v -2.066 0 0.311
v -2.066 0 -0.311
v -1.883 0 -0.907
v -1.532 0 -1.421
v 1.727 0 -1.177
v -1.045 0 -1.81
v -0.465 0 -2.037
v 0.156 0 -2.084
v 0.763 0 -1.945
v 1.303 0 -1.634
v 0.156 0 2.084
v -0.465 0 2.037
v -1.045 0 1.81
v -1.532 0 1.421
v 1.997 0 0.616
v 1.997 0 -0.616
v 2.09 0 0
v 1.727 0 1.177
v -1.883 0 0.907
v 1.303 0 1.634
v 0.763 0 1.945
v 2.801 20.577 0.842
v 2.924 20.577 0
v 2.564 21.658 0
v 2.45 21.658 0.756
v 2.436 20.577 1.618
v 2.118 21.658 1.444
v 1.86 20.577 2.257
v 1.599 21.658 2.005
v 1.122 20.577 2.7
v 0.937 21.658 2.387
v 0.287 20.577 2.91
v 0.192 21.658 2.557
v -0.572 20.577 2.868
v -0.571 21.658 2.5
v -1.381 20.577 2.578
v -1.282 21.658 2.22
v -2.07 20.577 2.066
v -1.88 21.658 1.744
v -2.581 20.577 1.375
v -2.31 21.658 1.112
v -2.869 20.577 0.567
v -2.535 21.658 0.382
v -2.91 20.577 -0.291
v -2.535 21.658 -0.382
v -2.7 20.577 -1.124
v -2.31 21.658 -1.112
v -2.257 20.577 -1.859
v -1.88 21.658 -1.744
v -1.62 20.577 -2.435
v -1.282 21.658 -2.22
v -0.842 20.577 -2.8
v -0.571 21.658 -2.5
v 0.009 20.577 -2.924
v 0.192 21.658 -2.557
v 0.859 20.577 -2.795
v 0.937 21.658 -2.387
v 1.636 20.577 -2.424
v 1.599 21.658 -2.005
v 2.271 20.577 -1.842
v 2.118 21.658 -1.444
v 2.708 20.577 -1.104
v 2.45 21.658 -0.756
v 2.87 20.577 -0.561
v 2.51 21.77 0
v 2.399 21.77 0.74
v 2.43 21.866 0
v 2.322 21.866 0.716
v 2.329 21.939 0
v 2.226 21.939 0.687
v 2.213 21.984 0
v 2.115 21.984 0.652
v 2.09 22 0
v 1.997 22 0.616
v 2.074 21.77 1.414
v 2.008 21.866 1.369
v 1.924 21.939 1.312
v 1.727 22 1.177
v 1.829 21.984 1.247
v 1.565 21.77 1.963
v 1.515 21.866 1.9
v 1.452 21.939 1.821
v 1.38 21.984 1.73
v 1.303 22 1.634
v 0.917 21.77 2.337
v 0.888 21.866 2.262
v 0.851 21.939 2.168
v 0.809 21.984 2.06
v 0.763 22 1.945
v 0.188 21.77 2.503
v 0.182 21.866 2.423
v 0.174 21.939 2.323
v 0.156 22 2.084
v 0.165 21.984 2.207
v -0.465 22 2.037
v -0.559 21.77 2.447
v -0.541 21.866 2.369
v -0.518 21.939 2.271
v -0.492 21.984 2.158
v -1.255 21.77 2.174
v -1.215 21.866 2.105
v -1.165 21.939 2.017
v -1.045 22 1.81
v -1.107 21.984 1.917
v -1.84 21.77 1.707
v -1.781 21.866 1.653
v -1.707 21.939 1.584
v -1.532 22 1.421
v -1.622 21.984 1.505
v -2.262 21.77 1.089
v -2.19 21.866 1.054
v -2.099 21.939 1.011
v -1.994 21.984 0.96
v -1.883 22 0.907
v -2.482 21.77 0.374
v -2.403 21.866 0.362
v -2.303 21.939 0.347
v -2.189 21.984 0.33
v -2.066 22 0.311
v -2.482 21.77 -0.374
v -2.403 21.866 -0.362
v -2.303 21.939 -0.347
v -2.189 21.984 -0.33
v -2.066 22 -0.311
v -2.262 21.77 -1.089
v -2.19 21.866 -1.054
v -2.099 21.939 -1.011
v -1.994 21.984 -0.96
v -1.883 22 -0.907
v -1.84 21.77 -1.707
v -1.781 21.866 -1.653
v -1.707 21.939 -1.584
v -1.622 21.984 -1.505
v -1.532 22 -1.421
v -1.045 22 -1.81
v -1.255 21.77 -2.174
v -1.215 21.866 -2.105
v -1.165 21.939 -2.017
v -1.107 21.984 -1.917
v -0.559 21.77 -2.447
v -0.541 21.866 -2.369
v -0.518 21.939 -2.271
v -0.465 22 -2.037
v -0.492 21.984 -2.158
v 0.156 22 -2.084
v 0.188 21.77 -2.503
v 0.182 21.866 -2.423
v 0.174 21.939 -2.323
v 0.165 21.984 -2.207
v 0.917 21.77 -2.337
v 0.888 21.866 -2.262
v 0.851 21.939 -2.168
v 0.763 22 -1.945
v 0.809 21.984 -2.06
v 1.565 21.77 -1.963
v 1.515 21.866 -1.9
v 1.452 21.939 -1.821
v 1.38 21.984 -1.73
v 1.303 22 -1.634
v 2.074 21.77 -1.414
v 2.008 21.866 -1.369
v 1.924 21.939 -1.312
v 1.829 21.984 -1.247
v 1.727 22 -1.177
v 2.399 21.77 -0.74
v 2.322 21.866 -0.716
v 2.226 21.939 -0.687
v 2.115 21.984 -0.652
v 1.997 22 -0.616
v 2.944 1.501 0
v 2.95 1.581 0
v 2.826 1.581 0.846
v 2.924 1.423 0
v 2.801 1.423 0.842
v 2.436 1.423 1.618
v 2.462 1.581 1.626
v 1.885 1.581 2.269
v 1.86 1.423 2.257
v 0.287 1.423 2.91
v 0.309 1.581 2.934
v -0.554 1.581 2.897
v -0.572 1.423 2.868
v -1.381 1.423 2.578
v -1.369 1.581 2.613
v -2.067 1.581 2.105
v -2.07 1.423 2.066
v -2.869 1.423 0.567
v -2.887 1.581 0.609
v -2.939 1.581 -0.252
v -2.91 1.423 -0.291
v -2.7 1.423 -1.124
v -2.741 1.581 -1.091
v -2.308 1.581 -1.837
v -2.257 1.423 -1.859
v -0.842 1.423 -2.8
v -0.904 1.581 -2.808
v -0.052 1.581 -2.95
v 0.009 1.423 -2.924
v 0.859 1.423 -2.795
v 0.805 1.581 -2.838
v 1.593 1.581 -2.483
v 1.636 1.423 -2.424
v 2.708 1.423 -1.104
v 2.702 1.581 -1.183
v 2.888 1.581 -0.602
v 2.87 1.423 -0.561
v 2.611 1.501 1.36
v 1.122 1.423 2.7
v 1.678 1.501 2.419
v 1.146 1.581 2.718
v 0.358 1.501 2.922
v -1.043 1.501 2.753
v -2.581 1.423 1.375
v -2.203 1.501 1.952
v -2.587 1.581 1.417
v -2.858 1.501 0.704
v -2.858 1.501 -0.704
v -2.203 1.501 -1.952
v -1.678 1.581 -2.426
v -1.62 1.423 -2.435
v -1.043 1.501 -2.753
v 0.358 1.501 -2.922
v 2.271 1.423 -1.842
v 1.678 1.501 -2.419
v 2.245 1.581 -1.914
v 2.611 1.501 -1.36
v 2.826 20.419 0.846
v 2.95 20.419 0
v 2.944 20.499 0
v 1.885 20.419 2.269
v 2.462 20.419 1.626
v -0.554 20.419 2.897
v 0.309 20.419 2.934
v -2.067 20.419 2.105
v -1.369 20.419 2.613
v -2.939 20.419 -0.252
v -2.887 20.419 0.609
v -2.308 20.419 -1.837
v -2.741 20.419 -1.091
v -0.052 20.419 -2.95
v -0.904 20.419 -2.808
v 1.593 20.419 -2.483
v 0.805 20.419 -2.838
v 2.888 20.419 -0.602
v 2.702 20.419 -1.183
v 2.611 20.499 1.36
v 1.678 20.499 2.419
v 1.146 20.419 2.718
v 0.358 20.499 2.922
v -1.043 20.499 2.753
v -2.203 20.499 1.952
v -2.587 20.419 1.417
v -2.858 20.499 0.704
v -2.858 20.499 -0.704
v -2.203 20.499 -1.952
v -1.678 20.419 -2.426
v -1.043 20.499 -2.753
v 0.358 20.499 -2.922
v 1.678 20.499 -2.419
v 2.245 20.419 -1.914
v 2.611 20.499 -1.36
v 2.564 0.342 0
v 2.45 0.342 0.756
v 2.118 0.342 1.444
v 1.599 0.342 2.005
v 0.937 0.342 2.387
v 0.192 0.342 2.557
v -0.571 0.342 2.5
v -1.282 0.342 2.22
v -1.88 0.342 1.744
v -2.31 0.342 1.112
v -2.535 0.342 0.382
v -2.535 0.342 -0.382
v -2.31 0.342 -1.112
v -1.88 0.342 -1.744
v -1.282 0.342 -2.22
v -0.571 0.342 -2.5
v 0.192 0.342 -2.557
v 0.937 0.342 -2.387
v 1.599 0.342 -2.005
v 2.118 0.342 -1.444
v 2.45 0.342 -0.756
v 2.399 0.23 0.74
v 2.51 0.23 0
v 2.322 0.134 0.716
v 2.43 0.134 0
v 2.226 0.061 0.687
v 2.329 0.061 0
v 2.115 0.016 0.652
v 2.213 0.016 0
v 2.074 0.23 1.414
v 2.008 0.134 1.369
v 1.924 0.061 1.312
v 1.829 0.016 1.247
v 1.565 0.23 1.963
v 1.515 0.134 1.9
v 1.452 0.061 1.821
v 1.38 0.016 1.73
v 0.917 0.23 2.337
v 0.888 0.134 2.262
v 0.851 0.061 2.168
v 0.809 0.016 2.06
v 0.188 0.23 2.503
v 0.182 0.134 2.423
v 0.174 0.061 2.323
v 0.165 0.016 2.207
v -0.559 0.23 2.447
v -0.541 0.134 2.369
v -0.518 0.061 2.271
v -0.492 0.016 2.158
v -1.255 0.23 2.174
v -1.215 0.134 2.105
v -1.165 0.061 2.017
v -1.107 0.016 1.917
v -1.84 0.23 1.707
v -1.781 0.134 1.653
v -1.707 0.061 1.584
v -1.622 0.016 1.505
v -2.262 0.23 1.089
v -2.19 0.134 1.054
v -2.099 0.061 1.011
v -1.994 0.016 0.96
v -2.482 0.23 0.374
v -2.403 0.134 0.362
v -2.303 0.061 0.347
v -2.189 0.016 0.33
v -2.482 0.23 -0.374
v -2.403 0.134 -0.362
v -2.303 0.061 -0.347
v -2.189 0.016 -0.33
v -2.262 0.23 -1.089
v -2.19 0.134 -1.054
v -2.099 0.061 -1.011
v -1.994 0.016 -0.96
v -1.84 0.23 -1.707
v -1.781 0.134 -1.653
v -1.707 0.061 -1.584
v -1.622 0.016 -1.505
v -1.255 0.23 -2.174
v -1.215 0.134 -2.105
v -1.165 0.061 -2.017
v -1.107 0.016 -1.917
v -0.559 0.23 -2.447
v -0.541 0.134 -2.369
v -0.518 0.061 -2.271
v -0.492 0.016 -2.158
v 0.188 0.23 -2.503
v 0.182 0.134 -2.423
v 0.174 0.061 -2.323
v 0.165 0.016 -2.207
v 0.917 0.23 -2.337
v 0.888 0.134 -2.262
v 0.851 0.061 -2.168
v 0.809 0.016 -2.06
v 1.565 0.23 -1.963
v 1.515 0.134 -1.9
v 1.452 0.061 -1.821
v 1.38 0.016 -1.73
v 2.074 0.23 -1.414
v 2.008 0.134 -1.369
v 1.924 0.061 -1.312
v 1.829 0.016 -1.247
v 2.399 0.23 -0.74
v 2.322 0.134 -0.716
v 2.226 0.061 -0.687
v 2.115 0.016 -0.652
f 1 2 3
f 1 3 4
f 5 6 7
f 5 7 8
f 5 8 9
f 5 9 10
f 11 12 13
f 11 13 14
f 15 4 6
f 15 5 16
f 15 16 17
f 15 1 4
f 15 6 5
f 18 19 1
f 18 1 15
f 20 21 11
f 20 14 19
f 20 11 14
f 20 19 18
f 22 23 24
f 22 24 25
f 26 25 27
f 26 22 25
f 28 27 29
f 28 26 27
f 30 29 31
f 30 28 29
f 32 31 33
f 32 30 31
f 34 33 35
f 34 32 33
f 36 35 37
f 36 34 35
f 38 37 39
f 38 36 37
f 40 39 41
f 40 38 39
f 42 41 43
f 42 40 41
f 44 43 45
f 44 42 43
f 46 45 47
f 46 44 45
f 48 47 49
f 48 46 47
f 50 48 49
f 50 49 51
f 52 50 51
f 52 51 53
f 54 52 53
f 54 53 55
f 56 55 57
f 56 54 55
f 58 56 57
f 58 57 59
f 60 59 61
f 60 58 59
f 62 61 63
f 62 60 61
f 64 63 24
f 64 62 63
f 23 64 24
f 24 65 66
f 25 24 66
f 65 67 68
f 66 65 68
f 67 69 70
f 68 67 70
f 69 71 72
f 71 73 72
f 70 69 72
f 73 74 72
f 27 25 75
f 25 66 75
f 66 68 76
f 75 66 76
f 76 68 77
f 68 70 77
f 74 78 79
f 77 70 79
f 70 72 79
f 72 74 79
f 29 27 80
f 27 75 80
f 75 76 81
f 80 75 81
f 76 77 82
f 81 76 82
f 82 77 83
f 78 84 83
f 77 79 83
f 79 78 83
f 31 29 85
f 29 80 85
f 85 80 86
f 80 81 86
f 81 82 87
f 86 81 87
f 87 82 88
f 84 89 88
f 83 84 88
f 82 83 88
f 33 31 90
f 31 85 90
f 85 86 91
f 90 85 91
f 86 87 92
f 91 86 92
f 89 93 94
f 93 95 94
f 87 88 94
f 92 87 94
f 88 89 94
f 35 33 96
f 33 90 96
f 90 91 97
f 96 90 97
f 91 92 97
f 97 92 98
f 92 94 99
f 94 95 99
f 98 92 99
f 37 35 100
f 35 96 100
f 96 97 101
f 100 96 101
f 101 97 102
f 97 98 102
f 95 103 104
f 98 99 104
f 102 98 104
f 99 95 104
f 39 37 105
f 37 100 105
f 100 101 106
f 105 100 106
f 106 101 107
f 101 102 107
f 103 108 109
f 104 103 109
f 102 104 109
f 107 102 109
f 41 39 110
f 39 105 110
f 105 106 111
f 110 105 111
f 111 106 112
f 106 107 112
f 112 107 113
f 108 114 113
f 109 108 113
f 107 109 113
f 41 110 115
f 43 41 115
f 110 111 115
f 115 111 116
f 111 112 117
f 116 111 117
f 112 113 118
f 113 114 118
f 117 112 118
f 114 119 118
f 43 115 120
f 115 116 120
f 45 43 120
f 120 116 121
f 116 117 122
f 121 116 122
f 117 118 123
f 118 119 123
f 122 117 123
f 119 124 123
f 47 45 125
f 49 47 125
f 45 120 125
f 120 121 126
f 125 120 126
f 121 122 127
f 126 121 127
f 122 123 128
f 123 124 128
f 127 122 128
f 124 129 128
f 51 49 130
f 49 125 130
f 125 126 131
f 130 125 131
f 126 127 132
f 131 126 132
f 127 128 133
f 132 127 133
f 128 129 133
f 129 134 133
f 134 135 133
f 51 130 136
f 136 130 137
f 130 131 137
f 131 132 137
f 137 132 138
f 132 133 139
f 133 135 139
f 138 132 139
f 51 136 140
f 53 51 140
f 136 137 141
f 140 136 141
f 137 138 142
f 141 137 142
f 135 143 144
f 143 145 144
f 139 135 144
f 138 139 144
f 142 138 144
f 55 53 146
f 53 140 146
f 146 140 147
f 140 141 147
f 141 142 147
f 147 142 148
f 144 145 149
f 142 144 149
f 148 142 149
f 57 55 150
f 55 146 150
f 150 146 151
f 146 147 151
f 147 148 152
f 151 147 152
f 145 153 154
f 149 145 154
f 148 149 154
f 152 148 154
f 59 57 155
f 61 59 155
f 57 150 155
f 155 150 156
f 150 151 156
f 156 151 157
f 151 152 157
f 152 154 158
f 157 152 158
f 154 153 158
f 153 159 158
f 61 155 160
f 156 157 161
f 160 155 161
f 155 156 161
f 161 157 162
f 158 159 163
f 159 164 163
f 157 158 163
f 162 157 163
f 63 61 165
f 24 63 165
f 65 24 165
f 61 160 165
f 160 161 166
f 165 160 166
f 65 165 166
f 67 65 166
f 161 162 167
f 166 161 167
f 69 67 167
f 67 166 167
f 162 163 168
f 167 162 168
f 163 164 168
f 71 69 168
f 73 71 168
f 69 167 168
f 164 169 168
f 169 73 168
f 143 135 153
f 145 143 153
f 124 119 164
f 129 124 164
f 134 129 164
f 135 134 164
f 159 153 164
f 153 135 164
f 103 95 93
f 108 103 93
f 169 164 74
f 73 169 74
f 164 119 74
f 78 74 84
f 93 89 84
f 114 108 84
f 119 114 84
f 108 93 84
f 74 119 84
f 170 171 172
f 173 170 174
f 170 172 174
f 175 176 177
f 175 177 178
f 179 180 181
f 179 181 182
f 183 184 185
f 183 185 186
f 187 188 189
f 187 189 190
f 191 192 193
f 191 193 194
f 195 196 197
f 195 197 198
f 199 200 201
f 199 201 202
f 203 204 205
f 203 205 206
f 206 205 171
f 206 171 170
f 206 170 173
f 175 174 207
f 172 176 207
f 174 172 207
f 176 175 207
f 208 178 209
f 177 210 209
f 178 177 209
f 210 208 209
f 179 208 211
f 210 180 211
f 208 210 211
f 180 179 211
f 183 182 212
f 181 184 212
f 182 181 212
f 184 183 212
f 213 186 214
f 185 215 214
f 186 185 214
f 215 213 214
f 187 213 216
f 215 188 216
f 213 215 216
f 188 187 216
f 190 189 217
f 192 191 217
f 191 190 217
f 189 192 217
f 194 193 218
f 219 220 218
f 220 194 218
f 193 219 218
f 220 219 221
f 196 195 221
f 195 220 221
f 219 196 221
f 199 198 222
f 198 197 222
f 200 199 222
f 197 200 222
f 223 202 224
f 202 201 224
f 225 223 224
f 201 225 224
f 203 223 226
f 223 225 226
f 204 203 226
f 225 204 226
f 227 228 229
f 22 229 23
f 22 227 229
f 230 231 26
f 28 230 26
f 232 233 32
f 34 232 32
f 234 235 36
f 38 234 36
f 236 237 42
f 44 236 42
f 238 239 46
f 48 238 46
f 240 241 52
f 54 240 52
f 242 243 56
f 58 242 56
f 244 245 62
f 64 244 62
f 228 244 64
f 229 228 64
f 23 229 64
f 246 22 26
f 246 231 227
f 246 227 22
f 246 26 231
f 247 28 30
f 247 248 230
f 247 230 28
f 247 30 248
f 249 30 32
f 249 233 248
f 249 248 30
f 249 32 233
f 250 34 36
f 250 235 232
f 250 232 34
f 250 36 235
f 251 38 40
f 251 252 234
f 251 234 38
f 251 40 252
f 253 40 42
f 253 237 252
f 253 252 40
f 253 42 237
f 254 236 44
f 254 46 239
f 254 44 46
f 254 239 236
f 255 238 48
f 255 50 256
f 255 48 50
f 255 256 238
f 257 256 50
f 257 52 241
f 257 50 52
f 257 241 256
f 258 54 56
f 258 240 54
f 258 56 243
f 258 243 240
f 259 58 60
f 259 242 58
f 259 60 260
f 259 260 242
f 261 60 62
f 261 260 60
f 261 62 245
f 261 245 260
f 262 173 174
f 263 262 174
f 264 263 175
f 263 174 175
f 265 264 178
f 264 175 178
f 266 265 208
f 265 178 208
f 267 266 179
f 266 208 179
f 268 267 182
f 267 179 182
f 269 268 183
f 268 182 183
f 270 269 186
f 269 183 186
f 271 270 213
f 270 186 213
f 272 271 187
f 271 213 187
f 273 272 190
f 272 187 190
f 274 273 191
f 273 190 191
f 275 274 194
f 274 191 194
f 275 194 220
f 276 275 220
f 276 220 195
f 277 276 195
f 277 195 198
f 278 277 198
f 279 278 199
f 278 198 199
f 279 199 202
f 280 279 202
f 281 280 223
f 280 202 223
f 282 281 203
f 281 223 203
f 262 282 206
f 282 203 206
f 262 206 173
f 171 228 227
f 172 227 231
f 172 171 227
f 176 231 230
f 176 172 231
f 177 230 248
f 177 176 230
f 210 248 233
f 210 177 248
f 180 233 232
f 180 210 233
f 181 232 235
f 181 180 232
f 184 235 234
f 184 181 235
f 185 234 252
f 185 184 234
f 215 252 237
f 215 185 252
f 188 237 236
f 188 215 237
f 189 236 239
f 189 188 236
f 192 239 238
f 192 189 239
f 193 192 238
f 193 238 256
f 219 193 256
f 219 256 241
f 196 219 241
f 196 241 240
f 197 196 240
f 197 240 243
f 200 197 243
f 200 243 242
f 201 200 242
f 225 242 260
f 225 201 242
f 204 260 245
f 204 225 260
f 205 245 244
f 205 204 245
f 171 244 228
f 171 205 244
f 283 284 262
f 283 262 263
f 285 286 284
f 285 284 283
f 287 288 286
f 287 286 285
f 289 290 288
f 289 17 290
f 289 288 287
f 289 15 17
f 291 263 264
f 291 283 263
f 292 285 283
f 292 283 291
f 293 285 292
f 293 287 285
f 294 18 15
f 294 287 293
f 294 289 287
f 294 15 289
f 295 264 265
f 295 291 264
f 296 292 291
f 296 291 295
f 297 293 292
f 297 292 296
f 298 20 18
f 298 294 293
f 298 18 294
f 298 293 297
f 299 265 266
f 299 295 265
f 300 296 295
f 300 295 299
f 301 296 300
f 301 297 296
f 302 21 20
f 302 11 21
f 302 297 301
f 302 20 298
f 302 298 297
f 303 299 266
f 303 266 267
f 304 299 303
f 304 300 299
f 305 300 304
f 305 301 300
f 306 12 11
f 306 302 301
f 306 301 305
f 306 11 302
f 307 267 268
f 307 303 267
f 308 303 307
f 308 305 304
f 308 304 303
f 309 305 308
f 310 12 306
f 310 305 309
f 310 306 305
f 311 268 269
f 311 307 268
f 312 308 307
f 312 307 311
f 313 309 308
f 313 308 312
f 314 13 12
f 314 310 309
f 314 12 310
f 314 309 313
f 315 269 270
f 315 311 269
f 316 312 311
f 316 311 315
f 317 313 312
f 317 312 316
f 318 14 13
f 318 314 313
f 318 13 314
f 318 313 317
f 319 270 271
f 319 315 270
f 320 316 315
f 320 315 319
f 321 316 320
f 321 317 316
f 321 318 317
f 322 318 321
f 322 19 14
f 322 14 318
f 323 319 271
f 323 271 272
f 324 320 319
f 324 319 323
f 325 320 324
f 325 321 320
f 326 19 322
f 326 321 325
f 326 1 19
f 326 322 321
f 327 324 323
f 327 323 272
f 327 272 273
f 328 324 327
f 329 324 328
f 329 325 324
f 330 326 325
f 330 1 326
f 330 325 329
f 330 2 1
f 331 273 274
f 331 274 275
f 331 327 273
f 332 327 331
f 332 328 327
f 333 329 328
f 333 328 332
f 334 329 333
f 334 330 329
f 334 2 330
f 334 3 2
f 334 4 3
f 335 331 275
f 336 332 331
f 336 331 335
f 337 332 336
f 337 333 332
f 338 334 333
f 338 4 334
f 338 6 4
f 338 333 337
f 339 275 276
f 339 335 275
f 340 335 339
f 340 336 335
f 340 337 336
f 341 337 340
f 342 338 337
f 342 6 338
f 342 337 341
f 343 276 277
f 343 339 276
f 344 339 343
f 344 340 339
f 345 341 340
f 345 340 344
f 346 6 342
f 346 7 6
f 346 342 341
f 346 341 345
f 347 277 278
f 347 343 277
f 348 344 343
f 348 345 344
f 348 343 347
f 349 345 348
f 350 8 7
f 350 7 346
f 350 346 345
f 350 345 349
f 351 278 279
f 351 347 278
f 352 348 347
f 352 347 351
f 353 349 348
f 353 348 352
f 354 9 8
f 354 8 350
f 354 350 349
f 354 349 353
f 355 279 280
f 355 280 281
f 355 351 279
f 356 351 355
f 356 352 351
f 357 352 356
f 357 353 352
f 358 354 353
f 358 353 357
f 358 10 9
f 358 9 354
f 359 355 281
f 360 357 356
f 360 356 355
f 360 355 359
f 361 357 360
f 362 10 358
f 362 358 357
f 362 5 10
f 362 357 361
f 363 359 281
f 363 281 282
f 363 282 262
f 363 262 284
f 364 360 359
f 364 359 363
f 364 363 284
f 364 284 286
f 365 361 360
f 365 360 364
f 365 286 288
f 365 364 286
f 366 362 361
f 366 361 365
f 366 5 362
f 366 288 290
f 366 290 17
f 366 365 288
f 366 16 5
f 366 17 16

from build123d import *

# Parameters (mm, degrees)
F0_R       = 2.95
F1_DEPTH   = 22
F2_SIZE2   = 1.5
F2_SIZE    = 0.5
F2_2_SIZE2 = 1.5
F2_2_SIZE  = 0.5
F3_R       = 0.5


with BuildPart() as f1:
    # F0 (on Front) → F1 (new body)
    with BuildSketch(Plane.XZ):
        Circle(F0_R)
    extrude(amount=-F1_DEPTH)

    # F2
    f2_edges = [f1.edges().sort_by_distance(p)[0] for p in [
        (-2.95, 0, 0),
    ]]
    f2_side = f1.faces().sort_by_distance((0, 0, 0))[0]
    chamfer(f2_edges, length=F2_SIZE, length2=F2_SIZE2, reference=f2_side)

    # F2#2
    f2_2_edges = [f1.edges().sort_by_distance(p)[0] for p in [
        (-2.95, 22, 0),
    ]]
    f2_2_side = f1.faces().sort_by_distance((0, 22, 0))[0]
    chamfer(f2_2_edges, length=F2_2_SIZE, length2=F2_2_SIZE2, reference=f2_2_side)

    # F3
    f3_edges = [f1.edges().sort_by_distance(p)[0] for p in [
        (-2.45, 0, 0),
        (-2.45, 22, 0),
        (-2.95, 1.5, 0),
        (-2.95, 20.5, 0),
    ]]
    fillet(f3_edges, radius=F3_R)


solid = f1.part
